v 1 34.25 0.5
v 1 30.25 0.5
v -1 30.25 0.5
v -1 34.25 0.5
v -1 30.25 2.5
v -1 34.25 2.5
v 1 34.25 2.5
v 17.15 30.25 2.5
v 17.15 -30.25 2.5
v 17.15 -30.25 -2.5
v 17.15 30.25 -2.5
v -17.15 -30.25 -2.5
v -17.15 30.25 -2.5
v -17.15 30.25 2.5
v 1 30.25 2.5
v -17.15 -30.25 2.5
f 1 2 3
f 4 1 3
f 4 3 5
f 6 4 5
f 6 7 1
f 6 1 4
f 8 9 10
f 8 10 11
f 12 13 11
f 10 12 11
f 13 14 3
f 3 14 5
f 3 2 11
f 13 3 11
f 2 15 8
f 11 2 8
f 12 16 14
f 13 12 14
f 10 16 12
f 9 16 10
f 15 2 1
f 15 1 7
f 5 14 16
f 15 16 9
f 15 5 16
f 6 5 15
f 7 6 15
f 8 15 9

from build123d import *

# Parameters (mm, degrees)
SKETCH_W     = 34.3
SKETCH_H     = 60.5
PAD_DEPTH    = 2.5
SKETCH001_W  = 2
SKETCH001_H  = 2
PAD001_DEPTH = 4


with BuildPart() as part:
    # Sketch → Pad (new body, symmetric)
    with BuildSketch(Plane.XY):
        Rectangle(SKETCH_W, SKETCH_H)
    extrude(amount=PAD_DEPTH, both=True)

    # Sketch001 → Pad001 (new body)
    with BuildSketch(Plane(origin=(0, 30.25, 0), x_dir=(-1, 0, 0), z_dir=(0, 1, 0))):
        with Locations((0, 1.5)):
            Rectangle(SKETCH001_W, SKETCH001_H)
    extrude(amount=PAD001_DEPTH)


solid = part.part
